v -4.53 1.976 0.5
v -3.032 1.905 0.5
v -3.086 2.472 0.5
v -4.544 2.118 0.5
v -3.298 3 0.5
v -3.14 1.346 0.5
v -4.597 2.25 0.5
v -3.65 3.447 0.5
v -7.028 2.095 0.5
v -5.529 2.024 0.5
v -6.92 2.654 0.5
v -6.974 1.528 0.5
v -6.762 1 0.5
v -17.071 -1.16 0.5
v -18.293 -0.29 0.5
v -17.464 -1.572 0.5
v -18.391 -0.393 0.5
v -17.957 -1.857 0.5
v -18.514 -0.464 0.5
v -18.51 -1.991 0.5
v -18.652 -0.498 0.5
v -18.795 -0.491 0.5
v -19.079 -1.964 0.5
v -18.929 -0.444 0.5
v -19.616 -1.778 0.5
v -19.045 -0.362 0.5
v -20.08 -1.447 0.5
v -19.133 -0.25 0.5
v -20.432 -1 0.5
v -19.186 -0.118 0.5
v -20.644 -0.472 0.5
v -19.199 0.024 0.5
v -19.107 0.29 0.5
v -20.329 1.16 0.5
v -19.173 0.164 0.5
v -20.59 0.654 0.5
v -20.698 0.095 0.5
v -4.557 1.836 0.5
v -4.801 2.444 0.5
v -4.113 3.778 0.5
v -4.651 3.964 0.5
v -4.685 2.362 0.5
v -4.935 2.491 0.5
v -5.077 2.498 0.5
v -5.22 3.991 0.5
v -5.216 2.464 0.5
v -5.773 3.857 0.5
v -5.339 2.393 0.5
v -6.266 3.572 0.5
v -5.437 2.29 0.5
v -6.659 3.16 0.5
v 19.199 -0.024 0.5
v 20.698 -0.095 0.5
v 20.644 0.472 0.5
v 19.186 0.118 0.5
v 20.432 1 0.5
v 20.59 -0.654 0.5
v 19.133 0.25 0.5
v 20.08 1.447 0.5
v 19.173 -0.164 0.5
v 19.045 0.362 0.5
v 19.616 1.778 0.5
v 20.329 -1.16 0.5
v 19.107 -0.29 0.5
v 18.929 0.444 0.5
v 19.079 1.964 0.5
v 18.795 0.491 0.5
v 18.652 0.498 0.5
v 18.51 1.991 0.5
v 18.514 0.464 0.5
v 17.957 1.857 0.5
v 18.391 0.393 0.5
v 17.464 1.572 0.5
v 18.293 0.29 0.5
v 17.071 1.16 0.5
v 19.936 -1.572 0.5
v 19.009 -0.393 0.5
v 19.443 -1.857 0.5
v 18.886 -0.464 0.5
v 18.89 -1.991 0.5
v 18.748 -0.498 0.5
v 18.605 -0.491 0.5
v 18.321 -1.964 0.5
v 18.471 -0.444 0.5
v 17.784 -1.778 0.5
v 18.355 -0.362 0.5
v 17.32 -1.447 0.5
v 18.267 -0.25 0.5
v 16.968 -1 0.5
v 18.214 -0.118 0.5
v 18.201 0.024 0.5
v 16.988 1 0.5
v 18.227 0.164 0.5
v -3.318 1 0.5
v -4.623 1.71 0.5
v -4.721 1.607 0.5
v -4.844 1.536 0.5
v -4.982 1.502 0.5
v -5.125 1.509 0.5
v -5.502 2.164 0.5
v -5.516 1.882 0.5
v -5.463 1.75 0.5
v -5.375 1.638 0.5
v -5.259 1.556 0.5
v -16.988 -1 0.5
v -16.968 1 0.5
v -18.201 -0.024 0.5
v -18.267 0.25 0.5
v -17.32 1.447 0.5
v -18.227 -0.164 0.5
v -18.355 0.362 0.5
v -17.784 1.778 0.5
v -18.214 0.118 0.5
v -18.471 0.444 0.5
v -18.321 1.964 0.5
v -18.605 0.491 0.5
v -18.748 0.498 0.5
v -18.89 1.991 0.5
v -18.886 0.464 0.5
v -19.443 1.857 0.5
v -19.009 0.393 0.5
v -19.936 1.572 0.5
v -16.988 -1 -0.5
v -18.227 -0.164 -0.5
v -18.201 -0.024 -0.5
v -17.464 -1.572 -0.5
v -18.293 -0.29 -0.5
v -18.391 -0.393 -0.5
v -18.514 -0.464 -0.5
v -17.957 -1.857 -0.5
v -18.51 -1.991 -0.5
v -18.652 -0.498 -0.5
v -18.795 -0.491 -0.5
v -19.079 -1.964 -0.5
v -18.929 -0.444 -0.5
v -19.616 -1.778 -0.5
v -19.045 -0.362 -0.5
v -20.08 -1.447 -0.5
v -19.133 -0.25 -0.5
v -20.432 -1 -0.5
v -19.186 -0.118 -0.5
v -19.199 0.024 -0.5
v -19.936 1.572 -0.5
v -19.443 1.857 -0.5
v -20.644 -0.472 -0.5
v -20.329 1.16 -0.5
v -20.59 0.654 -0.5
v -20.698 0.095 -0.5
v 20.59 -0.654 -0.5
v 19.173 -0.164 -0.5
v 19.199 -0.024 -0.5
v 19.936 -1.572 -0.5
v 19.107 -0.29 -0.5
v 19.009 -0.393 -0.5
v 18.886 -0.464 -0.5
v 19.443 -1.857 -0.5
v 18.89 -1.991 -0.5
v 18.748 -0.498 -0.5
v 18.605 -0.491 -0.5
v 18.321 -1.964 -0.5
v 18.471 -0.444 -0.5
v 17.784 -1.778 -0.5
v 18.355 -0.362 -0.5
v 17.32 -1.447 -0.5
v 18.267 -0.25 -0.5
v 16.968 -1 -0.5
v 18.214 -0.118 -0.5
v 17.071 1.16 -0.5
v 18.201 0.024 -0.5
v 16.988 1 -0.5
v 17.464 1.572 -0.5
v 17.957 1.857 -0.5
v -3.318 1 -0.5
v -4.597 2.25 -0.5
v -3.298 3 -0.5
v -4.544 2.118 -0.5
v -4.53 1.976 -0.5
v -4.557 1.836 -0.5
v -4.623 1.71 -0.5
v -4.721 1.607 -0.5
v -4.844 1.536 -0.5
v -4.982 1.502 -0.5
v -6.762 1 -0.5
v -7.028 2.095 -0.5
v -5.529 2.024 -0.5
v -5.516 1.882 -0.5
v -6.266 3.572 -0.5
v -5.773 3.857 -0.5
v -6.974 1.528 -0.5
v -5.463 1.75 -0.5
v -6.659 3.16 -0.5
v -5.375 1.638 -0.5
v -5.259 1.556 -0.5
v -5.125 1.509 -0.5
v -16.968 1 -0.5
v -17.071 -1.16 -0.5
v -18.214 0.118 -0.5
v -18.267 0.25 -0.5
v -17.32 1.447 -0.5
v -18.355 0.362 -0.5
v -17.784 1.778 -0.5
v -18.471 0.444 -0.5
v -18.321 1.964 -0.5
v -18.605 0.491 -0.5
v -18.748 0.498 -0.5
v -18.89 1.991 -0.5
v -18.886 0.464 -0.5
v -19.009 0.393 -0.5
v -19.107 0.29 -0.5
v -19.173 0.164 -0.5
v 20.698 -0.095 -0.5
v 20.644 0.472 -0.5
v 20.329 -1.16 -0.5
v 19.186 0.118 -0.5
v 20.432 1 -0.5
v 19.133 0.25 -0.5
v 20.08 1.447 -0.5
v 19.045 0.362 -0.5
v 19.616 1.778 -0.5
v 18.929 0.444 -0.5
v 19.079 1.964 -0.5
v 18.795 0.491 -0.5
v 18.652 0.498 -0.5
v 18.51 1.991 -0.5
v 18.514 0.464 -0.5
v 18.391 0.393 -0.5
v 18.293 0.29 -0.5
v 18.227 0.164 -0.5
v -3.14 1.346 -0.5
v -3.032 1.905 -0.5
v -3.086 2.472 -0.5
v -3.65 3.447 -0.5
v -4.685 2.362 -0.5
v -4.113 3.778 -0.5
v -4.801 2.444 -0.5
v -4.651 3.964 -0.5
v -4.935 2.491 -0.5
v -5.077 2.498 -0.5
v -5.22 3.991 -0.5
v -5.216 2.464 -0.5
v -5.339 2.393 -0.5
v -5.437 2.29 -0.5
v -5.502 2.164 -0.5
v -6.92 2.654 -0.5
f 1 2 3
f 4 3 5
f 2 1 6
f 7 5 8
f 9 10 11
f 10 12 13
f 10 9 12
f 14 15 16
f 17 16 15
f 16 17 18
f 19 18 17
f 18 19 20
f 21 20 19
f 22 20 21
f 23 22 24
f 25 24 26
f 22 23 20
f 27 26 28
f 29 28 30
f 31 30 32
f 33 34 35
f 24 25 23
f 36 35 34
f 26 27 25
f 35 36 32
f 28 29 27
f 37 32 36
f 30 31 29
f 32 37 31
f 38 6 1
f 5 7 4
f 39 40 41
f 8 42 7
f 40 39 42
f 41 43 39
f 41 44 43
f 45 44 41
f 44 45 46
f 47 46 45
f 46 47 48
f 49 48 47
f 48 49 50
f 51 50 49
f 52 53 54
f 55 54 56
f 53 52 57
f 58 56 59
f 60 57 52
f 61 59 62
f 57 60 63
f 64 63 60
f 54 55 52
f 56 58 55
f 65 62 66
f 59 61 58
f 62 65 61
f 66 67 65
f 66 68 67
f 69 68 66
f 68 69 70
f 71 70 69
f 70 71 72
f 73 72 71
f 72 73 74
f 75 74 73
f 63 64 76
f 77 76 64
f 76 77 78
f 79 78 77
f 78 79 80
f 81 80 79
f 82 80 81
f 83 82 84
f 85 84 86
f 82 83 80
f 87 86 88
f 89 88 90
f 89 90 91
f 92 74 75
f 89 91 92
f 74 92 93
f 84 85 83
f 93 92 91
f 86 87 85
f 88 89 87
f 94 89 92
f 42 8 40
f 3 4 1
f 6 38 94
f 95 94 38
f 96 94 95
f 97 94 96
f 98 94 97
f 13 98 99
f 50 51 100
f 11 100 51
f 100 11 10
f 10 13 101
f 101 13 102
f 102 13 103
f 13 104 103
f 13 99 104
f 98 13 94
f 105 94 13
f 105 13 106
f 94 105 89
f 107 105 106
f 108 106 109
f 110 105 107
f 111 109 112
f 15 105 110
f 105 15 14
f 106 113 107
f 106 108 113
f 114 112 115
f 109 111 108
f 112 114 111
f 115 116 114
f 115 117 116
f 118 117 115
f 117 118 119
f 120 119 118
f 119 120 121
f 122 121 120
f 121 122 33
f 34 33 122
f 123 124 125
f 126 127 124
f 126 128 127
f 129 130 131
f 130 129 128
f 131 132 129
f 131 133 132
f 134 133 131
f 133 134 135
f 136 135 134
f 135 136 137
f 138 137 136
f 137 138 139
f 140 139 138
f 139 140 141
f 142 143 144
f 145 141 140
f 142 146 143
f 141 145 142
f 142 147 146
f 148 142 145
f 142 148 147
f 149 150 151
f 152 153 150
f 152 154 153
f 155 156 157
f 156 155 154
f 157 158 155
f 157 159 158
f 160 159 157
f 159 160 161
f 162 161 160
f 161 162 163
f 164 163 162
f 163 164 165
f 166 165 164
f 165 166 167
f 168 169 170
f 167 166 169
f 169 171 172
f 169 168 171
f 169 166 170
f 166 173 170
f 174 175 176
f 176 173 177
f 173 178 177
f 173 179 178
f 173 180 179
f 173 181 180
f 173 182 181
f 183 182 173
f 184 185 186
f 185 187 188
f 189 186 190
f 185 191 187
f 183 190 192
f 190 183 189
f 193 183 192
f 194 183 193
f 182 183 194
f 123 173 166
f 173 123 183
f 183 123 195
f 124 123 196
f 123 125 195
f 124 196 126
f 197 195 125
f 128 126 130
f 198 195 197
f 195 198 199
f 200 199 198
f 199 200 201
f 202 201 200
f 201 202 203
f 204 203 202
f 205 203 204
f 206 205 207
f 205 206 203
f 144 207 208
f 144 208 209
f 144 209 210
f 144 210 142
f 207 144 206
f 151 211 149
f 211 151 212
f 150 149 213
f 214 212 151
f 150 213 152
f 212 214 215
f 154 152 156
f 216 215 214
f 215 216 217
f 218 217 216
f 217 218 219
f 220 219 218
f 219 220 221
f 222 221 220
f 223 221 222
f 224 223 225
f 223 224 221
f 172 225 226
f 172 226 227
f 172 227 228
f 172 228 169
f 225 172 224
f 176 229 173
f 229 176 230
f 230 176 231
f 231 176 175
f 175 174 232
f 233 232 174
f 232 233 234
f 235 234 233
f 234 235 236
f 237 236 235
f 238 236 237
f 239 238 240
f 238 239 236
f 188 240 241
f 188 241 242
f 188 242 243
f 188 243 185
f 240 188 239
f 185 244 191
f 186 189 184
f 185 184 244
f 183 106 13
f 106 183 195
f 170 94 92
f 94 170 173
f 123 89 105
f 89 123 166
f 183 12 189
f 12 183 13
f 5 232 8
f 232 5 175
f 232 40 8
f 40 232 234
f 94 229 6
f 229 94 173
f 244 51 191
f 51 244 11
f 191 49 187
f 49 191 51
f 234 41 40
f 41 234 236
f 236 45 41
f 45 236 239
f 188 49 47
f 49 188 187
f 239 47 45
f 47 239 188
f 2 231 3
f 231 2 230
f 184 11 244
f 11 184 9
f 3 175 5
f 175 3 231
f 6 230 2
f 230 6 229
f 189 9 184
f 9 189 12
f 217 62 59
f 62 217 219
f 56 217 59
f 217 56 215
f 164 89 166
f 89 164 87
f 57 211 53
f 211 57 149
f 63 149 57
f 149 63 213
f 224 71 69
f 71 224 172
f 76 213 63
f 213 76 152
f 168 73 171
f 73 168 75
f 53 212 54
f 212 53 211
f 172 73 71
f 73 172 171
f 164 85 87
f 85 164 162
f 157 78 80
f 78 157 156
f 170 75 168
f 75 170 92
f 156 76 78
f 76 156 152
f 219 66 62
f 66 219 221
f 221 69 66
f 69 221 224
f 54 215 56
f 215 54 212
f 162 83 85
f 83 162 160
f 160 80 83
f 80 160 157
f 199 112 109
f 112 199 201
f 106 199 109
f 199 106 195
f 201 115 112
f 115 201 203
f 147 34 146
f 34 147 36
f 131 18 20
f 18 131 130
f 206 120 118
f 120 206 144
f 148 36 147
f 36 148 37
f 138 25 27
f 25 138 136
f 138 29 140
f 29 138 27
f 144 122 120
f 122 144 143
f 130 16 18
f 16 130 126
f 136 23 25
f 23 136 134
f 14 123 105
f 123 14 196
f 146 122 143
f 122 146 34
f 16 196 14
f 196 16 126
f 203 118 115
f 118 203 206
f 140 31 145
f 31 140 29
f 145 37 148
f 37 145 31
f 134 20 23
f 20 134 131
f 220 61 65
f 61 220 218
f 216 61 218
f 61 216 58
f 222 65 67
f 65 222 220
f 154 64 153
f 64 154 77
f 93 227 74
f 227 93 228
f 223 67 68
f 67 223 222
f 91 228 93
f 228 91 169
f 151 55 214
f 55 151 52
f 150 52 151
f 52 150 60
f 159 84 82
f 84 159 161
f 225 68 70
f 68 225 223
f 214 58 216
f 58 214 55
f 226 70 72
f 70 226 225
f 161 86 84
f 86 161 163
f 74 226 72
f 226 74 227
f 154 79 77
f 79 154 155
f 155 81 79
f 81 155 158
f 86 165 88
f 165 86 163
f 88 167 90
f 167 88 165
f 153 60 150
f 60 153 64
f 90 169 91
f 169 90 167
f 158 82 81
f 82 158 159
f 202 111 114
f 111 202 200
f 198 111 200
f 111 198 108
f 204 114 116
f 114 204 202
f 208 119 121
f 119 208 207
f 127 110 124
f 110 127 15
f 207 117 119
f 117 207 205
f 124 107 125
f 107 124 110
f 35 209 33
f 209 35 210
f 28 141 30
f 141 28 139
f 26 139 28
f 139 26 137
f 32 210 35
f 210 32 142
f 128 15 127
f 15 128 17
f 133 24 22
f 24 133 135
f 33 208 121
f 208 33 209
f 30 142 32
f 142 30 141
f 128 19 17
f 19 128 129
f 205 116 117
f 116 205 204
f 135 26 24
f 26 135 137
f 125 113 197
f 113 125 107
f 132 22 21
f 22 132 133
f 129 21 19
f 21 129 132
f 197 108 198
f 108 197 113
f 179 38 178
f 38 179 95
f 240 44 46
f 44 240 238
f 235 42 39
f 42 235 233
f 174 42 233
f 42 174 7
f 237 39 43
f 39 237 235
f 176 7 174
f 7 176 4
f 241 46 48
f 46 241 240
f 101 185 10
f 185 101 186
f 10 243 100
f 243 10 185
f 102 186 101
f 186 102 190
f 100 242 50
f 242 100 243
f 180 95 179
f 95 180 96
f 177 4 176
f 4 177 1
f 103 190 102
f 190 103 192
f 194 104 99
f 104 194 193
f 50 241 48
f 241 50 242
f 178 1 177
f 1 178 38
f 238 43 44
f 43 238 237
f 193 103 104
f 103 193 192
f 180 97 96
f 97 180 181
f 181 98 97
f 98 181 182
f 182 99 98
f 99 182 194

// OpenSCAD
//
// Parametric mobile base
// Based on http://www.thingiverse.com/thing:22958 by Ablapo.
//
// equation: m1*a+0.5*a*q*a*ro = m2*b+0.5*b*q*b*ro
// 
//

length = 37.4;	// distance between endpoint fixtures
hole = 0.5;		// fixture hole radius
ends = 2.0;    // end circle radius

m1 =9.2;		// weigth #1
m2 = 16;		// weigth #2
sy=2;			// y thickness
sz=1;			// z thickness
alt = 2;	// altitude of center fixture

ro=1.08/1000	;		 // gramm/mm^3 of ABS

detail=22; 				// details



q=sy*sz;
s= length*(0.5-1/(1+m1/m2));					 // simple one for heavy weights m1/m2, not used
s2= 0.5*length-(length*m2+0.5*length*length*q*ro)/(m1+m2+length*q*ro); //more exact placement

difference (){
	union(){
		cube ([hole*4+length,sy,sz],center=true);
		// center circle
		translate ([s2,alt,0]) rotate([0,0,30])
			cylinder (h=sz, r=ends, center=true, $fn=detail);
		// m1 circle
		translate ([length/2,0,0]) rotate([0,0,30])
			cylinder (h=sz, r=ends, center=true, $fn=detail);
		// m2 circle
		translate ([-length/2,0,0]) rotate([0,0,30])
			cylinder (h=sz, r=ends, center=true, $fn=detail);
	}
	// cut m1 fixture
	translate ([length/2,0,0]) rotate([0,0,30])
		cylinder (h=2*sz, r=hole, center=true, $fn=detail);
	// cut m2 fixture
	translate ([-length/2,0,0]) rotate([0,0,30])
		cylinder (h=2*sz, r=hole, center=true, $fn=detail);
	// cut center top fixture
	translate ([s2,alt,0]) rotate([0,0,30])
		cylinder (h=2*sz, r=hole, center=true, $fn=detail);
}
